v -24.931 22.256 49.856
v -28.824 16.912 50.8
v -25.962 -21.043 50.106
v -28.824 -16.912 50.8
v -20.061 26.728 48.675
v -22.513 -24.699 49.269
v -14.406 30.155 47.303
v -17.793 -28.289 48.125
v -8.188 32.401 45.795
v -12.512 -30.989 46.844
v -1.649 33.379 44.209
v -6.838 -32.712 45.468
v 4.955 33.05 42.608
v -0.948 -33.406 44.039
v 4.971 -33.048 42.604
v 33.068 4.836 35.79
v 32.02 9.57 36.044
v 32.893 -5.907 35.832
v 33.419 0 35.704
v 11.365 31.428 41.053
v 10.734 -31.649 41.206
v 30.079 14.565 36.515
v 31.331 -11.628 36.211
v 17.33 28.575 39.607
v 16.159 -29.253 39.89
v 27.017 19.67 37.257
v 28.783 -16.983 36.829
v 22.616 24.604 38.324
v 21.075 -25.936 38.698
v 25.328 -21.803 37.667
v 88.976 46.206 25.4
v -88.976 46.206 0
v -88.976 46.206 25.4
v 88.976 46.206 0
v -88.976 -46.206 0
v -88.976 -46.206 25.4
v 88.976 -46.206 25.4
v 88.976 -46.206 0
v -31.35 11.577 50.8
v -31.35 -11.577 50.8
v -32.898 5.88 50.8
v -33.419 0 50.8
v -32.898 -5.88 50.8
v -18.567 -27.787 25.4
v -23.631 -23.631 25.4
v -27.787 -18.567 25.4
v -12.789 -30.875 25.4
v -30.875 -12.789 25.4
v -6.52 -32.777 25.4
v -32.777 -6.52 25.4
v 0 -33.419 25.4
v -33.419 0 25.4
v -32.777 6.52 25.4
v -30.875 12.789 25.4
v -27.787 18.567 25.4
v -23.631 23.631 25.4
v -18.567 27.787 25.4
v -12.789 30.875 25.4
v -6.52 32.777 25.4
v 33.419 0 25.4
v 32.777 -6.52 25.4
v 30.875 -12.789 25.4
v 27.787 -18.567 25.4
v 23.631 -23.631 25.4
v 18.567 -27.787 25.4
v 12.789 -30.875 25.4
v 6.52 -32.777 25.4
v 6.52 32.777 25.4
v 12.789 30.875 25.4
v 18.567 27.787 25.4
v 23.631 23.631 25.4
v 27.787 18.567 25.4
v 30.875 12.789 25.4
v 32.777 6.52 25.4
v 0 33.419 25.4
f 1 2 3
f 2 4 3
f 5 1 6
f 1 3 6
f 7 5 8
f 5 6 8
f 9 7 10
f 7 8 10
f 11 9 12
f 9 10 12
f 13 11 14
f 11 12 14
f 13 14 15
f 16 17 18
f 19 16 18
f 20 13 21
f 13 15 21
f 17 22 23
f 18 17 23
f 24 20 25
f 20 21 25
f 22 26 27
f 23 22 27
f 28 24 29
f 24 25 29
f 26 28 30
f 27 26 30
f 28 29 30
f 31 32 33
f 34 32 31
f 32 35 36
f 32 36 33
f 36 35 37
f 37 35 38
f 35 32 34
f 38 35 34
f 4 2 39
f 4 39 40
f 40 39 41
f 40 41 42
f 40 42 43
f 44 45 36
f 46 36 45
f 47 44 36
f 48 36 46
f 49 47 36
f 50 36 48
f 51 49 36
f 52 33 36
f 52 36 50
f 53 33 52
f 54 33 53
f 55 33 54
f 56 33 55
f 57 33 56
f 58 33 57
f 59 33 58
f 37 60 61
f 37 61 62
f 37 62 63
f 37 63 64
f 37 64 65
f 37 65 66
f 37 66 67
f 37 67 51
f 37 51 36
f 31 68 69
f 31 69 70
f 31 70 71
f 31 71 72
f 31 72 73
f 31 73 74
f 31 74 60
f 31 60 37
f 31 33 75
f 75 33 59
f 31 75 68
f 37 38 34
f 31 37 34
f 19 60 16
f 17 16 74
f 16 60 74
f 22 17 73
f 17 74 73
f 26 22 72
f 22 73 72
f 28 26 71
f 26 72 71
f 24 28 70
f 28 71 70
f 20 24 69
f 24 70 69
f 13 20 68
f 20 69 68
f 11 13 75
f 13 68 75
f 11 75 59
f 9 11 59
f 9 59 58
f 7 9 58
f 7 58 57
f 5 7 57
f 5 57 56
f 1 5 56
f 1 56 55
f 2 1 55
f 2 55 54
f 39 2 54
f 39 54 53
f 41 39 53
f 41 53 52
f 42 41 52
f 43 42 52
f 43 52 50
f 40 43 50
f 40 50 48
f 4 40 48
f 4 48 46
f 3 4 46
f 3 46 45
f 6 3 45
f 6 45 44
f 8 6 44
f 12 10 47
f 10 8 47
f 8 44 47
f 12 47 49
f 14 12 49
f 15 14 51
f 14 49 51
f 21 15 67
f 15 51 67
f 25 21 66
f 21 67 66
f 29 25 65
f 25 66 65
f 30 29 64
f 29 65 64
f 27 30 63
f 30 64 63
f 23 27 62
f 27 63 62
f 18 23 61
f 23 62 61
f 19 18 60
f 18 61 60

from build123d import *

# Parameters (mm, degrees)
F0_W     = 177.951604
F0_H     = 92.412182
F0_R     = 33.419382
F1_DEPTH = 25.4
F2_DEPTH = 50.8
F4_DEPTH = 38.1


with BuildPart() as f1:
    # F0 (on Top) → F1 (new body)
    with BuildSketch(Plane.XY):
        Rectangle(F0_W, F0_H)
        Circle(F0_R, mode=Mode.SUBTRACT)
        Circle(F0_R)
    extrude(amount=F1_DEPTH)

    # F0 (on Top) → F2 (join)
    with BuildSketch(Plane.XY):
        Circle(F0_R)
    extrude(amount=F2_DEPTH)

    # F3 (on Front) → F4 (cut, symmetric)
    with BuildSketch(Plane.XZ):
        Polygon((44.763692, 56.282684), (-43.013971, 54.241341), (44.763692, 32.953072), align=None)
    extrude(amount=F4_DEPTH, both=True, mode=Mode.SUBTRACT)


solid = f1.part
